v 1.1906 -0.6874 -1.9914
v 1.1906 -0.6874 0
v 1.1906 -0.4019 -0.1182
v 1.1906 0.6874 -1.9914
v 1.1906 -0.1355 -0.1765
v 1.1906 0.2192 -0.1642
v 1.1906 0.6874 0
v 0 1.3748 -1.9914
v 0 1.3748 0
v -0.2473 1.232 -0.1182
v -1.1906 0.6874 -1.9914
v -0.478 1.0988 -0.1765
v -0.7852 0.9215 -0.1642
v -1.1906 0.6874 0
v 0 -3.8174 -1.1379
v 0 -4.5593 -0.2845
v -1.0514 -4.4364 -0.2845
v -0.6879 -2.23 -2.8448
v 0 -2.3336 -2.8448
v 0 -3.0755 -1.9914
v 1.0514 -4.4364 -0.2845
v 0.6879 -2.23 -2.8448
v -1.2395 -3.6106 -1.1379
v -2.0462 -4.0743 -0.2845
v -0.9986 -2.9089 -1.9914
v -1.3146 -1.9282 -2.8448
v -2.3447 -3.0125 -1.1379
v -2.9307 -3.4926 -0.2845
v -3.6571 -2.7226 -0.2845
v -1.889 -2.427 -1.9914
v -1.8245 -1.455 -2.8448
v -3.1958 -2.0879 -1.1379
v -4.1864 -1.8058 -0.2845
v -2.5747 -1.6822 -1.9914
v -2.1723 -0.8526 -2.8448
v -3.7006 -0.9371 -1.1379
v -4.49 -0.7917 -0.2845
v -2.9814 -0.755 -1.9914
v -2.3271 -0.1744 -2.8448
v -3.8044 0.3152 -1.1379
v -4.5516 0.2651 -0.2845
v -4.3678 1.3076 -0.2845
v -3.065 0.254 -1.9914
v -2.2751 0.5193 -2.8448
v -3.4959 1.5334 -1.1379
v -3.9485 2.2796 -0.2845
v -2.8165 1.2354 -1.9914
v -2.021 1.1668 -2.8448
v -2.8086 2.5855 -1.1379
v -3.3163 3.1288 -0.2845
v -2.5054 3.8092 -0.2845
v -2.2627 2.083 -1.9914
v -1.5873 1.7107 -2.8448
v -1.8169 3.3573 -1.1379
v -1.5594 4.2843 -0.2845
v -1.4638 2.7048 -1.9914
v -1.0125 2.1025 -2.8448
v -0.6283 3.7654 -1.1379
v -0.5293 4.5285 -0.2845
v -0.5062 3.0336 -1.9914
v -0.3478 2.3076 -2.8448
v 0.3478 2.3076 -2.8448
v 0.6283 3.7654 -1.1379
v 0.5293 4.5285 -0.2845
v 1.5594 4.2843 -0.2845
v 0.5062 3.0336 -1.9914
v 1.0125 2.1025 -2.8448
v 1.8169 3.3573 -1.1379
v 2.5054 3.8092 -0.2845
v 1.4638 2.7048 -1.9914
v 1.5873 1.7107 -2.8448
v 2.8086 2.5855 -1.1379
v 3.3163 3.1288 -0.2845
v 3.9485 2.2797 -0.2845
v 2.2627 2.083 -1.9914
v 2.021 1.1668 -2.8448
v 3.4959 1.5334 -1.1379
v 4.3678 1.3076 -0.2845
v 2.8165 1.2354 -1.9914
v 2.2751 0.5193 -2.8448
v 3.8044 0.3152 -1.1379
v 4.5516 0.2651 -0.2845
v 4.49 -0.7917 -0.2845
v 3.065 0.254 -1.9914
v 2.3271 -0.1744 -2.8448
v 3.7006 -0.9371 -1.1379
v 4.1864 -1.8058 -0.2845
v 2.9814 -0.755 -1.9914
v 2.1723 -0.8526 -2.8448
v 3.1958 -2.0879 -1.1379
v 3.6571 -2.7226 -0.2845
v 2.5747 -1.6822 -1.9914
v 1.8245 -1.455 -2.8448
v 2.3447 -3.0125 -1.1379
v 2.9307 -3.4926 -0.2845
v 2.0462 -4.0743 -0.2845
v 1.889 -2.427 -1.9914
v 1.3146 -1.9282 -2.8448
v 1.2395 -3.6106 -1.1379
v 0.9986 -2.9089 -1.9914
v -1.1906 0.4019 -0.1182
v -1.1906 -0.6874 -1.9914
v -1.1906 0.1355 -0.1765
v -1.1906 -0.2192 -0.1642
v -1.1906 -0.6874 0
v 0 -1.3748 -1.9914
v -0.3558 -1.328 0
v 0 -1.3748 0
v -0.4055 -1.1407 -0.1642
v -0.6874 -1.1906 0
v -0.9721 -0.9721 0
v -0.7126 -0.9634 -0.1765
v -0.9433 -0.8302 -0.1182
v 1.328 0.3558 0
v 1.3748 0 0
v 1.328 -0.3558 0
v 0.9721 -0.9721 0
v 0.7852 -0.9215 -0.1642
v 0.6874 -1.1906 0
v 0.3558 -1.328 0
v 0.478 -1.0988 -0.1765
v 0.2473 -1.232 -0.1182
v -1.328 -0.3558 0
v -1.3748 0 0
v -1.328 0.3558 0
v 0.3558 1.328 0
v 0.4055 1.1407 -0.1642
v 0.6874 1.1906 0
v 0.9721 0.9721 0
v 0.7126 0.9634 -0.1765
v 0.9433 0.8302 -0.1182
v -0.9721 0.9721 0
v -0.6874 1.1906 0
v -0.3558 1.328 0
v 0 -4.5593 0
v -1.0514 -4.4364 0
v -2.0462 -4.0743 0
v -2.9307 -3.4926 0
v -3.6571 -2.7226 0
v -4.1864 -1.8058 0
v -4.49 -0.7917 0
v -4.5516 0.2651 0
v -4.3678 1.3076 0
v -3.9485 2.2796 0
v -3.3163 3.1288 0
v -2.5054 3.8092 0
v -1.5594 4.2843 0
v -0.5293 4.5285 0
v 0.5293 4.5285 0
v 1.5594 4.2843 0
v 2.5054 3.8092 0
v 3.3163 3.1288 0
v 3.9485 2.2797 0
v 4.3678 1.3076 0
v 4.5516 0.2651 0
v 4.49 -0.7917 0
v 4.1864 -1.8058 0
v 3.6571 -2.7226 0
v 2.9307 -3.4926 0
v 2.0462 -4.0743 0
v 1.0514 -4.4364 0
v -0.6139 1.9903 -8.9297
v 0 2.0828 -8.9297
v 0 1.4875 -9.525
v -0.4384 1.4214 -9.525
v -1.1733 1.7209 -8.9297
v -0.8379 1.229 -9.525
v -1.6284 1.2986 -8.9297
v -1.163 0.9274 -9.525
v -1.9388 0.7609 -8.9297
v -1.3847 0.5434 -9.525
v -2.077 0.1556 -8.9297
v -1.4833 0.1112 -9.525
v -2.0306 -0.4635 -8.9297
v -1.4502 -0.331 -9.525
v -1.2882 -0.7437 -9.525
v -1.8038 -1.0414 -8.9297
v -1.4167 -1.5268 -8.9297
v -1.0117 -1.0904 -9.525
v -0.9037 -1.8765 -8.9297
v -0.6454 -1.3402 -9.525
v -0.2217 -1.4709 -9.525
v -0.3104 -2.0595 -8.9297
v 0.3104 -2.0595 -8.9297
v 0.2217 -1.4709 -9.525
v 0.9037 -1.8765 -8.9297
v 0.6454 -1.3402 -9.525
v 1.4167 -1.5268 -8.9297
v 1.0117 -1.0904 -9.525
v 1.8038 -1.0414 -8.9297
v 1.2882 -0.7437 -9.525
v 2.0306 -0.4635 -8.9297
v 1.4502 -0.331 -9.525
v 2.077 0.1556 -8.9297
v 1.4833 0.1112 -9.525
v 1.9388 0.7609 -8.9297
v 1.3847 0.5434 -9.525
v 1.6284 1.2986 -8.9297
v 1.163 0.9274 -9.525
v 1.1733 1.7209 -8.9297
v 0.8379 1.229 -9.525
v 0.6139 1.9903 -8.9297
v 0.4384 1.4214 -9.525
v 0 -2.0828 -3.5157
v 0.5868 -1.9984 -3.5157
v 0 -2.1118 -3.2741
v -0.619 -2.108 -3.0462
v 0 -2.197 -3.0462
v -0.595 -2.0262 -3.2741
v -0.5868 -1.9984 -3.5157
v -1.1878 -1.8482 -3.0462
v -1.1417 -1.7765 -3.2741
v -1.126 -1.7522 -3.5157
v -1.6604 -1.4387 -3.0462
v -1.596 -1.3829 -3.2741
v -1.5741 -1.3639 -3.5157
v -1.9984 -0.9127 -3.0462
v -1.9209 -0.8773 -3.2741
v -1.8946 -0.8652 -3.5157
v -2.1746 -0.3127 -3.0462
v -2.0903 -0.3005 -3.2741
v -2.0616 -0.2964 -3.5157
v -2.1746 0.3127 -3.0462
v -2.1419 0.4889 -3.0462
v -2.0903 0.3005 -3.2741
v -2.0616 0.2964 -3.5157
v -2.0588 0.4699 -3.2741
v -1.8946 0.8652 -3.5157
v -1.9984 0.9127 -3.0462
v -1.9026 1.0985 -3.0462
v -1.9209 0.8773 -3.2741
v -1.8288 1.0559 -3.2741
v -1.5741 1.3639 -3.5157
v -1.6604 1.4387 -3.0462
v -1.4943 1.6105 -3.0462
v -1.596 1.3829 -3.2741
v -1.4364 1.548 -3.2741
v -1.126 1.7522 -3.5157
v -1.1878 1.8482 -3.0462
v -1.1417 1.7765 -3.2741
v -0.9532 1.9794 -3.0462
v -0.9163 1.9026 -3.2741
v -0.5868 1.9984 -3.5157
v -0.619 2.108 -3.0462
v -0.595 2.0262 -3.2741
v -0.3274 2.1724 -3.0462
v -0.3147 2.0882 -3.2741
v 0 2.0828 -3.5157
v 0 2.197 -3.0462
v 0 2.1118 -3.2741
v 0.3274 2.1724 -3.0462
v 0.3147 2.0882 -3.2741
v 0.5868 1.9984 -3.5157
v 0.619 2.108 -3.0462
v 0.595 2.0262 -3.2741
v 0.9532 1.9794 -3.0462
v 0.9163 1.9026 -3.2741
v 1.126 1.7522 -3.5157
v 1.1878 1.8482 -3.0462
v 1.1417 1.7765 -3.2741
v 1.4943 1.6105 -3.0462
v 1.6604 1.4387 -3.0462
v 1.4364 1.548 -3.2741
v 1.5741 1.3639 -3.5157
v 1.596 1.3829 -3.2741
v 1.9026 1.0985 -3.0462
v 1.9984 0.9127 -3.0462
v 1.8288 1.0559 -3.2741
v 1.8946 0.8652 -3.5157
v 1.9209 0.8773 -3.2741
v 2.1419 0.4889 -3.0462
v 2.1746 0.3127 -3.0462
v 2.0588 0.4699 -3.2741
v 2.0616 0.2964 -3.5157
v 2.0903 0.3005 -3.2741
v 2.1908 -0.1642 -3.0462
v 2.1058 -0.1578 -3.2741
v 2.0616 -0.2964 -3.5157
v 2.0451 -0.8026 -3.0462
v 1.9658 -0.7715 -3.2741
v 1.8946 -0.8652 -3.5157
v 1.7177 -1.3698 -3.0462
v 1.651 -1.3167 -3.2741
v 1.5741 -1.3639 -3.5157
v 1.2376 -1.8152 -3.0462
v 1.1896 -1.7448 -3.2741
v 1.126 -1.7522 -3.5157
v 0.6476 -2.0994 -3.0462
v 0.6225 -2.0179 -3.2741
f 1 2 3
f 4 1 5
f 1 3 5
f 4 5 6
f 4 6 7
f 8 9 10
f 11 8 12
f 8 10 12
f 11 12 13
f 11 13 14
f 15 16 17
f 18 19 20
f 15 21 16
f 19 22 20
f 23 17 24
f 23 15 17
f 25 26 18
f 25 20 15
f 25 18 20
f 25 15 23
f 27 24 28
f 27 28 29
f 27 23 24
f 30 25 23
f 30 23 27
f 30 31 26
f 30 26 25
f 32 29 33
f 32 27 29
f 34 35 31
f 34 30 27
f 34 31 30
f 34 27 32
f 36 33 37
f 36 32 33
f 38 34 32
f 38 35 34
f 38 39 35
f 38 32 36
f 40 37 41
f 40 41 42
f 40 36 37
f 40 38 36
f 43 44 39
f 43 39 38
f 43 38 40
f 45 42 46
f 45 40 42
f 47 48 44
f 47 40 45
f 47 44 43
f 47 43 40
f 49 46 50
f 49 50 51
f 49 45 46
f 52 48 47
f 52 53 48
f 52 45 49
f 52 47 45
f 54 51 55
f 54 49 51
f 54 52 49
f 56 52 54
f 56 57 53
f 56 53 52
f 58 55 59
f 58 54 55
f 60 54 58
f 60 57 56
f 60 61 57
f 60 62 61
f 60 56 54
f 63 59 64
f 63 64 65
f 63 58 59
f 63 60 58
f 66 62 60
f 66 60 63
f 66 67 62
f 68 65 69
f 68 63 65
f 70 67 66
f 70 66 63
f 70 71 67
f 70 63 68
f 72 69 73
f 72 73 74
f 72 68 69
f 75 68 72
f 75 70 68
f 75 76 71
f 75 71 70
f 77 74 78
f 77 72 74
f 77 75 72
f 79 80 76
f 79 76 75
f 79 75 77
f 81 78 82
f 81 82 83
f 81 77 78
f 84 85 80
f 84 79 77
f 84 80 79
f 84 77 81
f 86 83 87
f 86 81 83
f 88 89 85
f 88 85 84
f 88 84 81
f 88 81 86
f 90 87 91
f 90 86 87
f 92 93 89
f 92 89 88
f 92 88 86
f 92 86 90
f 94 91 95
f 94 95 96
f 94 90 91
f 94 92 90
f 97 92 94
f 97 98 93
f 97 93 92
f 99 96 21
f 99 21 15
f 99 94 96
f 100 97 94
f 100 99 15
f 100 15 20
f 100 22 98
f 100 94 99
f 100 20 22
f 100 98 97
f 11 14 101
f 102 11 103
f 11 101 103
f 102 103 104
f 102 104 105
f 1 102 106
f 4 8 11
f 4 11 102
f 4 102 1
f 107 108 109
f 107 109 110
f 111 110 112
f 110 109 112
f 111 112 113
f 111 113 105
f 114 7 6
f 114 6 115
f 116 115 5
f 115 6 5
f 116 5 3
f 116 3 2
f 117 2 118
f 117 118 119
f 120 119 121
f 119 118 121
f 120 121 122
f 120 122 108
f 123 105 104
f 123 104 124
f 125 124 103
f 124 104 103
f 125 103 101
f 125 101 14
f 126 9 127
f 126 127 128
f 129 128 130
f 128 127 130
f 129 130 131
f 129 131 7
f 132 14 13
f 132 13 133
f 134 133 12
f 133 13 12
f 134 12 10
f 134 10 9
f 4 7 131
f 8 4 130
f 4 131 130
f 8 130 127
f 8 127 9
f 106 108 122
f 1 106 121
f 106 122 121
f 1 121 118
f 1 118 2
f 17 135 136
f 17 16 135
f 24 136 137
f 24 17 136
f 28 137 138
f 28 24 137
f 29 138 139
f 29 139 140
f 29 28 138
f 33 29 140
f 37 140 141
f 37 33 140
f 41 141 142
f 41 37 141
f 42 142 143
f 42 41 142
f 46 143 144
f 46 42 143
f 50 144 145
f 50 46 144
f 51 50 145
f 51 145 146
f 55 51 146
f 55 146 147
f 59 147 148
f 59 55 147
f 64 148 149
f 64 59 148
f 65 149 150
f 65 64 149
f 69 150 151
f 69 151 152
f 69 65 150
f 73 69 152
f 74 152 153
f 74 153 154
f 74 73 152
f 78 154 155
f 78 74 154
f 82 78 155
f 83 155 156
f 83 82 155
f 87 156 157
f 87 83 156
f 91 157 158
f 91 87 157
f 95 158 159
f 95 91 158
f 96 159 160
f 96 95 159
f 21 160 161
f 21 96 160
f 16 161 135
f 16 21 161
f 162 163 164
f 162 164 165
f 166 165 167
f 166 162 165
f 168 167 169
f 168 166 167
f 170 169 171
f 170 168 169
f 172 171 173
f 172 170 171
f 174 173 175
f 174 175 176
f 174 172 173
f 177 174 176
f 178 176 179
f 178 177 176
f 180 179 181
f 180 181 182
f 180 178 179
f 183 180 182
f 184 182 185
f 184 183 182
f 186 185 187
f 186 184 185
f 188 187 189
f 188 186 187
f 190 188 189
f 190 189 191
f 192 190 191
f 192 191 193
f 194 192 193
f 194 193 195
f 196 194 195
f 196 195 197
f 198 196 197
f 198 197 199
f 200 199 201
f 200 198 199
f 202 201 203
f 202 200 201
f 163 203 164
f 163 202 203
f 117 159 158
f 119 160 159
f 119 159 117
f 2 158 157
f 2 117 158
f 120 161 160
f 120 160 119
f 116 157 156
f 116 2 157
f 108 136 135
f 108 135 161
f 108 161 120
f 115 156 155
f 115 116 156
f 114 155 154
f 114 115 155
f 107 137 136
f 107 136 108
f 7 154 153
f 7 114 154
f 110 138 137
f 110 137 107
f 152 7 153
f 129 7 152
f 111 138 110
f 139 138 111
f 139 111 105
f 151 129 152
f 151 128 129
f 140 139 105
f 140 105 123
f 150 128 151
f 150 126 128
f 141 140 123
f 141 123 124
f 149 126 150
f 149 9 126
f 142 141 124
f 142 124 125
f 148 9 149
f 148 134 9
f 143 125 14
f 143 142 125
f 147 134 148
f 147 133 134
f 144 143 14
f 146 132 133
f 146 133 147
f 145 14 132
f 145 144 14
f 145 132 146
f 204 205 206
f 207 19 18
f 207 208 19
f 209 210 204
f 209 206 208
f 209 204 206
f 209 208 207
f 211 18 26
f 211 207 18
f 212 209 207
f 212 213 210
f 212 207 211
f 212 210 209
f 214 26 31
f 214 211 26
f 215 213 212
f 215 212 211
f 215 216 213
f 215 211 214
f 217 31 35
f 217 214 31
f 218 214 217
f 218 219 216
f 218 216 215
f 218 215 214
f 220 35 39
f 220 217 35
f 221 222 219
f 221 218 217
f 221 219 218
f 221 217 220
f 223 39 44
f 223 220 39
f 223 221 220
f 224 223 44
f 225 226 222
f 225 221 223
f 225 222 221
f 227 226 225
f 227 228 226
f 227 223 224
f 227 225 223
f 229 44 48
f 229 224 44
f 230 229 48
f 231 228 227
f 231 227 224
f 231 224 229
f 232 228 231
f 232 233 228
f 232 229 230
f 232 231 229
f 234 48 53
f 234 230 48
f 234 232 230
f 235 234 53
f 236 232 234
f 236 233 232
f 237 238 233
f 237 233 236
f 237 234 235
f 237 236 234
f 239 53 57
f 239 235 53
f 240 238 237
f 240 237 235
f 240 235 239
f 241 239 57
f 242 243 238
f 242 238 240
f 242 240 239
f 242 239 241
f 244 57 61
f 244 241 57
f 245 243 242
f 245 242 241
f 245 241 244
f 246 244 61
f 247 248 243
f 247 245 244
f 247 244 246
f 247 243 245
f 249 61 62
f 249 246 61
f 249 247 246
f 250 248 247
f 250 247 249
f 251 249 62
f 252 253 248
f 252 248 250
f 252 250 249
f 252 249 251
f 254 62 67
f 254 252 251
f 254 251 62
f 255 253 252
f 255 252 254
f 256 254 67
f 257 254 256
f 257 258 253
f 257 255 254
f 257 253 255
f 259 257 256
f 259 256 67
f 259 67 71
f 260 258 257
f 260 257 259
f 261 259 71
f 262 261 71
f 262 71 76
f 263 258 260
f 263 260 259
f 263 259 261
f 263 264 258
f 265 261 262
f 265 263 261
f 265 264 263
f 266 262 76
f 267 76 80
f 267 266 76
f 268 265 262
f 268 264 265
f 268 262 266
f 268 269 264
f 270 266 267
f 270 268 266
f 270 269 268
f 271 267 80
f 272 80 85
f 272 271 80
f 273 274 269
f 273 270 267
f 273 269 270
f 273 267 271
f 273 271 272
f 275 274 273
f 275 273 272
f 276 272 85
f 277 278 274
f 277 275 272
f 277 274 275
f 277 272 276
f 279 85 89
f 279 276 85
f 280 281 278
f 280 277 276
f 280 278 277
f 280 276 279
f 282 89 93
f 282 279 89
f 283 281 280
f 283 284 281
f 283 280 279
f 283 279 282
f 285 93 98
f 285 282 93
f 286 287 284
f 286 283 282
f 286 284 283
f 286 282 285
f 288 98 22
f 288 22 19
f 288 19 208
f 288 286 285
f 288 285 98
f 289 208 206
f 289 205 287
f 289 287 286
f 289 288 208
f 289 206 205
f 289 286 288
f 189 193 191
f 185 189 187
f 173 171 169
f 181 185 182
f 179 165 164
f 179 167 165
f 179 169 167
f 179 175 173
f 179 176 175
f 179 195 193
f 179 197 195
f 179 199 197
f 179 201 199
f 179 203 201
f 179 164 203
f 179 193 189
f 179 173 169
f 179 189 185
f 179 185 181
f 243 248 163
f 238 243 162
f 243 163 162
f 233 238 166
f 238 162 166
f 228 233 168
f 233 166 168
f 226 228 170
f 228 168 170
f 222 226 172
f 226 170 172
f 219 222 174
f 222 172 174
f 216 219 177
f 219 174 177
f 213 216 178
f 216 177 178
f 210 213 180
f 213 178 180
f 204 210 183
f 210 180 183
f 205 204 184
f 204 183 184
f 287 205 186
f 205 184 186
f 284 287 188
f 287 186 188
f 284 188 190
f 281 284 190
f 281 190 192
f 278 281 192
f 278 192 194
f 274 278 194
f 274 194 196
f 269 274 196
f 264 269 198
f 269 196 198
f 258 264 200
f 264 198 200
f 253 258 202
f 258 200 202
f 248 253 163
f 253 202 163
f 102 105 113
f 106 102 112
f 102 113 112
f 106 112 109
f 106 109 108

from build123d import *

# Parameters (mm, degrees)
SKETCH1_W          = 9.525
SKETCH1_H          = 2.0828
CHAMFER1_SIZE      = 0.5953125
CUT_EXTRUDE2_DEPTH = 1.99136


with BuildPart() as part:
    # Sketch1 → Revolve1 (revolve)
    with BuildSketch(Plane(origin=(0, 0, 0), x_dir=(0, 0, -1), z_dir=(1, 0, 0))):
        with Locations((4.7625, 1.0414)):
            Rectangle(SKETCH1_W, SKETCH1_H)
    revolve(axis=Axis((0, 0, -9.525), (0, 0, 1)))

    # Chamfer1
    chamfer1_edges = [part.edges().sort_by_distance(p)[0] for p in [
        (0, -2.0828, -9.525),
    ]]
    chamfer(chamfer1_edges, length=CHAMFER1_SIZE)

    # Sketch7 → Revolve2 (revolve)
    with BuildSketch(Plane(origin=(0, 0, 0), x_dir=(0, 0, -1), z_dir=(1, 0, 0)), mode=Mode.PRIVATE) as revolve2_sk:
        with BuildLine():
            Line((0, 4.5593), (0.28448, 4.5593))
            Line((0.28448, 4.5593), (2.8448, 2.333647779))
            ThreePointArc((2.8448, 2.333647779), (3.157581097, 2.147562581), (3.515722863, 2.0828))
            Line((3.515722863, 2.0828), (3.515722863, 0))
            Line((3.515722863, 0), (0, 0))
            Line((0, 0), (0, 4.5593))
        make_face()
    revolve(revolve2_sk.sketch.rotate(Axis((0, 0, 0), (0, 0, -1)), 180), axis=Axis((0, 0, 0), (0, 0, -1)))

    # Boss-Extrude1 cone 1 section (through the dimple's axis) → Boss-Extrude1 (revolve)
    with BuildSketch(Plane(origin=(0, 0, -3.515722863), x_dir=(0, -1, 0), z_dir=(1, 0, 0))):
        Polygon((0, 0), (2.0828, 0), (0, 2.0828), align=None)
    revolve(axis=Axis((0, 0, -3.515722863), (0, 0, -1)))

    # Sketch5 → Cut-Extrude2 (cut)
    with BuildSketch(Plane.XY):
        Polygon((1.190625, -0.687407664), (1.190625, 0.687407664), (0, 1.374815329), (-1.190625, 0.687407664), (-1.190625, -0.687407664), (0, -1.374815329), align=None)
    extrude(amount=-CUT_EXTRUDE2_DEPTH, mode=Mode.SUBTRACT)

    # Cut-Extrude3 cone 1 section (through the dimple's axis) → Cut-Extrude3 (revolve, cut)
    with BuildSketch(Plane(origin=(0, 0, 0), x_dir=(0, -1, 0), z_dir=(1, 0, 0))):
        Polygon((0, 0), (1.374815329, 0), (0, 1.374815329), align=None)
    revolve(axis=Axis((0, 0, 0), (0, 0, -1)), mode=Mode.SUBTRACT)


solid = part.part
